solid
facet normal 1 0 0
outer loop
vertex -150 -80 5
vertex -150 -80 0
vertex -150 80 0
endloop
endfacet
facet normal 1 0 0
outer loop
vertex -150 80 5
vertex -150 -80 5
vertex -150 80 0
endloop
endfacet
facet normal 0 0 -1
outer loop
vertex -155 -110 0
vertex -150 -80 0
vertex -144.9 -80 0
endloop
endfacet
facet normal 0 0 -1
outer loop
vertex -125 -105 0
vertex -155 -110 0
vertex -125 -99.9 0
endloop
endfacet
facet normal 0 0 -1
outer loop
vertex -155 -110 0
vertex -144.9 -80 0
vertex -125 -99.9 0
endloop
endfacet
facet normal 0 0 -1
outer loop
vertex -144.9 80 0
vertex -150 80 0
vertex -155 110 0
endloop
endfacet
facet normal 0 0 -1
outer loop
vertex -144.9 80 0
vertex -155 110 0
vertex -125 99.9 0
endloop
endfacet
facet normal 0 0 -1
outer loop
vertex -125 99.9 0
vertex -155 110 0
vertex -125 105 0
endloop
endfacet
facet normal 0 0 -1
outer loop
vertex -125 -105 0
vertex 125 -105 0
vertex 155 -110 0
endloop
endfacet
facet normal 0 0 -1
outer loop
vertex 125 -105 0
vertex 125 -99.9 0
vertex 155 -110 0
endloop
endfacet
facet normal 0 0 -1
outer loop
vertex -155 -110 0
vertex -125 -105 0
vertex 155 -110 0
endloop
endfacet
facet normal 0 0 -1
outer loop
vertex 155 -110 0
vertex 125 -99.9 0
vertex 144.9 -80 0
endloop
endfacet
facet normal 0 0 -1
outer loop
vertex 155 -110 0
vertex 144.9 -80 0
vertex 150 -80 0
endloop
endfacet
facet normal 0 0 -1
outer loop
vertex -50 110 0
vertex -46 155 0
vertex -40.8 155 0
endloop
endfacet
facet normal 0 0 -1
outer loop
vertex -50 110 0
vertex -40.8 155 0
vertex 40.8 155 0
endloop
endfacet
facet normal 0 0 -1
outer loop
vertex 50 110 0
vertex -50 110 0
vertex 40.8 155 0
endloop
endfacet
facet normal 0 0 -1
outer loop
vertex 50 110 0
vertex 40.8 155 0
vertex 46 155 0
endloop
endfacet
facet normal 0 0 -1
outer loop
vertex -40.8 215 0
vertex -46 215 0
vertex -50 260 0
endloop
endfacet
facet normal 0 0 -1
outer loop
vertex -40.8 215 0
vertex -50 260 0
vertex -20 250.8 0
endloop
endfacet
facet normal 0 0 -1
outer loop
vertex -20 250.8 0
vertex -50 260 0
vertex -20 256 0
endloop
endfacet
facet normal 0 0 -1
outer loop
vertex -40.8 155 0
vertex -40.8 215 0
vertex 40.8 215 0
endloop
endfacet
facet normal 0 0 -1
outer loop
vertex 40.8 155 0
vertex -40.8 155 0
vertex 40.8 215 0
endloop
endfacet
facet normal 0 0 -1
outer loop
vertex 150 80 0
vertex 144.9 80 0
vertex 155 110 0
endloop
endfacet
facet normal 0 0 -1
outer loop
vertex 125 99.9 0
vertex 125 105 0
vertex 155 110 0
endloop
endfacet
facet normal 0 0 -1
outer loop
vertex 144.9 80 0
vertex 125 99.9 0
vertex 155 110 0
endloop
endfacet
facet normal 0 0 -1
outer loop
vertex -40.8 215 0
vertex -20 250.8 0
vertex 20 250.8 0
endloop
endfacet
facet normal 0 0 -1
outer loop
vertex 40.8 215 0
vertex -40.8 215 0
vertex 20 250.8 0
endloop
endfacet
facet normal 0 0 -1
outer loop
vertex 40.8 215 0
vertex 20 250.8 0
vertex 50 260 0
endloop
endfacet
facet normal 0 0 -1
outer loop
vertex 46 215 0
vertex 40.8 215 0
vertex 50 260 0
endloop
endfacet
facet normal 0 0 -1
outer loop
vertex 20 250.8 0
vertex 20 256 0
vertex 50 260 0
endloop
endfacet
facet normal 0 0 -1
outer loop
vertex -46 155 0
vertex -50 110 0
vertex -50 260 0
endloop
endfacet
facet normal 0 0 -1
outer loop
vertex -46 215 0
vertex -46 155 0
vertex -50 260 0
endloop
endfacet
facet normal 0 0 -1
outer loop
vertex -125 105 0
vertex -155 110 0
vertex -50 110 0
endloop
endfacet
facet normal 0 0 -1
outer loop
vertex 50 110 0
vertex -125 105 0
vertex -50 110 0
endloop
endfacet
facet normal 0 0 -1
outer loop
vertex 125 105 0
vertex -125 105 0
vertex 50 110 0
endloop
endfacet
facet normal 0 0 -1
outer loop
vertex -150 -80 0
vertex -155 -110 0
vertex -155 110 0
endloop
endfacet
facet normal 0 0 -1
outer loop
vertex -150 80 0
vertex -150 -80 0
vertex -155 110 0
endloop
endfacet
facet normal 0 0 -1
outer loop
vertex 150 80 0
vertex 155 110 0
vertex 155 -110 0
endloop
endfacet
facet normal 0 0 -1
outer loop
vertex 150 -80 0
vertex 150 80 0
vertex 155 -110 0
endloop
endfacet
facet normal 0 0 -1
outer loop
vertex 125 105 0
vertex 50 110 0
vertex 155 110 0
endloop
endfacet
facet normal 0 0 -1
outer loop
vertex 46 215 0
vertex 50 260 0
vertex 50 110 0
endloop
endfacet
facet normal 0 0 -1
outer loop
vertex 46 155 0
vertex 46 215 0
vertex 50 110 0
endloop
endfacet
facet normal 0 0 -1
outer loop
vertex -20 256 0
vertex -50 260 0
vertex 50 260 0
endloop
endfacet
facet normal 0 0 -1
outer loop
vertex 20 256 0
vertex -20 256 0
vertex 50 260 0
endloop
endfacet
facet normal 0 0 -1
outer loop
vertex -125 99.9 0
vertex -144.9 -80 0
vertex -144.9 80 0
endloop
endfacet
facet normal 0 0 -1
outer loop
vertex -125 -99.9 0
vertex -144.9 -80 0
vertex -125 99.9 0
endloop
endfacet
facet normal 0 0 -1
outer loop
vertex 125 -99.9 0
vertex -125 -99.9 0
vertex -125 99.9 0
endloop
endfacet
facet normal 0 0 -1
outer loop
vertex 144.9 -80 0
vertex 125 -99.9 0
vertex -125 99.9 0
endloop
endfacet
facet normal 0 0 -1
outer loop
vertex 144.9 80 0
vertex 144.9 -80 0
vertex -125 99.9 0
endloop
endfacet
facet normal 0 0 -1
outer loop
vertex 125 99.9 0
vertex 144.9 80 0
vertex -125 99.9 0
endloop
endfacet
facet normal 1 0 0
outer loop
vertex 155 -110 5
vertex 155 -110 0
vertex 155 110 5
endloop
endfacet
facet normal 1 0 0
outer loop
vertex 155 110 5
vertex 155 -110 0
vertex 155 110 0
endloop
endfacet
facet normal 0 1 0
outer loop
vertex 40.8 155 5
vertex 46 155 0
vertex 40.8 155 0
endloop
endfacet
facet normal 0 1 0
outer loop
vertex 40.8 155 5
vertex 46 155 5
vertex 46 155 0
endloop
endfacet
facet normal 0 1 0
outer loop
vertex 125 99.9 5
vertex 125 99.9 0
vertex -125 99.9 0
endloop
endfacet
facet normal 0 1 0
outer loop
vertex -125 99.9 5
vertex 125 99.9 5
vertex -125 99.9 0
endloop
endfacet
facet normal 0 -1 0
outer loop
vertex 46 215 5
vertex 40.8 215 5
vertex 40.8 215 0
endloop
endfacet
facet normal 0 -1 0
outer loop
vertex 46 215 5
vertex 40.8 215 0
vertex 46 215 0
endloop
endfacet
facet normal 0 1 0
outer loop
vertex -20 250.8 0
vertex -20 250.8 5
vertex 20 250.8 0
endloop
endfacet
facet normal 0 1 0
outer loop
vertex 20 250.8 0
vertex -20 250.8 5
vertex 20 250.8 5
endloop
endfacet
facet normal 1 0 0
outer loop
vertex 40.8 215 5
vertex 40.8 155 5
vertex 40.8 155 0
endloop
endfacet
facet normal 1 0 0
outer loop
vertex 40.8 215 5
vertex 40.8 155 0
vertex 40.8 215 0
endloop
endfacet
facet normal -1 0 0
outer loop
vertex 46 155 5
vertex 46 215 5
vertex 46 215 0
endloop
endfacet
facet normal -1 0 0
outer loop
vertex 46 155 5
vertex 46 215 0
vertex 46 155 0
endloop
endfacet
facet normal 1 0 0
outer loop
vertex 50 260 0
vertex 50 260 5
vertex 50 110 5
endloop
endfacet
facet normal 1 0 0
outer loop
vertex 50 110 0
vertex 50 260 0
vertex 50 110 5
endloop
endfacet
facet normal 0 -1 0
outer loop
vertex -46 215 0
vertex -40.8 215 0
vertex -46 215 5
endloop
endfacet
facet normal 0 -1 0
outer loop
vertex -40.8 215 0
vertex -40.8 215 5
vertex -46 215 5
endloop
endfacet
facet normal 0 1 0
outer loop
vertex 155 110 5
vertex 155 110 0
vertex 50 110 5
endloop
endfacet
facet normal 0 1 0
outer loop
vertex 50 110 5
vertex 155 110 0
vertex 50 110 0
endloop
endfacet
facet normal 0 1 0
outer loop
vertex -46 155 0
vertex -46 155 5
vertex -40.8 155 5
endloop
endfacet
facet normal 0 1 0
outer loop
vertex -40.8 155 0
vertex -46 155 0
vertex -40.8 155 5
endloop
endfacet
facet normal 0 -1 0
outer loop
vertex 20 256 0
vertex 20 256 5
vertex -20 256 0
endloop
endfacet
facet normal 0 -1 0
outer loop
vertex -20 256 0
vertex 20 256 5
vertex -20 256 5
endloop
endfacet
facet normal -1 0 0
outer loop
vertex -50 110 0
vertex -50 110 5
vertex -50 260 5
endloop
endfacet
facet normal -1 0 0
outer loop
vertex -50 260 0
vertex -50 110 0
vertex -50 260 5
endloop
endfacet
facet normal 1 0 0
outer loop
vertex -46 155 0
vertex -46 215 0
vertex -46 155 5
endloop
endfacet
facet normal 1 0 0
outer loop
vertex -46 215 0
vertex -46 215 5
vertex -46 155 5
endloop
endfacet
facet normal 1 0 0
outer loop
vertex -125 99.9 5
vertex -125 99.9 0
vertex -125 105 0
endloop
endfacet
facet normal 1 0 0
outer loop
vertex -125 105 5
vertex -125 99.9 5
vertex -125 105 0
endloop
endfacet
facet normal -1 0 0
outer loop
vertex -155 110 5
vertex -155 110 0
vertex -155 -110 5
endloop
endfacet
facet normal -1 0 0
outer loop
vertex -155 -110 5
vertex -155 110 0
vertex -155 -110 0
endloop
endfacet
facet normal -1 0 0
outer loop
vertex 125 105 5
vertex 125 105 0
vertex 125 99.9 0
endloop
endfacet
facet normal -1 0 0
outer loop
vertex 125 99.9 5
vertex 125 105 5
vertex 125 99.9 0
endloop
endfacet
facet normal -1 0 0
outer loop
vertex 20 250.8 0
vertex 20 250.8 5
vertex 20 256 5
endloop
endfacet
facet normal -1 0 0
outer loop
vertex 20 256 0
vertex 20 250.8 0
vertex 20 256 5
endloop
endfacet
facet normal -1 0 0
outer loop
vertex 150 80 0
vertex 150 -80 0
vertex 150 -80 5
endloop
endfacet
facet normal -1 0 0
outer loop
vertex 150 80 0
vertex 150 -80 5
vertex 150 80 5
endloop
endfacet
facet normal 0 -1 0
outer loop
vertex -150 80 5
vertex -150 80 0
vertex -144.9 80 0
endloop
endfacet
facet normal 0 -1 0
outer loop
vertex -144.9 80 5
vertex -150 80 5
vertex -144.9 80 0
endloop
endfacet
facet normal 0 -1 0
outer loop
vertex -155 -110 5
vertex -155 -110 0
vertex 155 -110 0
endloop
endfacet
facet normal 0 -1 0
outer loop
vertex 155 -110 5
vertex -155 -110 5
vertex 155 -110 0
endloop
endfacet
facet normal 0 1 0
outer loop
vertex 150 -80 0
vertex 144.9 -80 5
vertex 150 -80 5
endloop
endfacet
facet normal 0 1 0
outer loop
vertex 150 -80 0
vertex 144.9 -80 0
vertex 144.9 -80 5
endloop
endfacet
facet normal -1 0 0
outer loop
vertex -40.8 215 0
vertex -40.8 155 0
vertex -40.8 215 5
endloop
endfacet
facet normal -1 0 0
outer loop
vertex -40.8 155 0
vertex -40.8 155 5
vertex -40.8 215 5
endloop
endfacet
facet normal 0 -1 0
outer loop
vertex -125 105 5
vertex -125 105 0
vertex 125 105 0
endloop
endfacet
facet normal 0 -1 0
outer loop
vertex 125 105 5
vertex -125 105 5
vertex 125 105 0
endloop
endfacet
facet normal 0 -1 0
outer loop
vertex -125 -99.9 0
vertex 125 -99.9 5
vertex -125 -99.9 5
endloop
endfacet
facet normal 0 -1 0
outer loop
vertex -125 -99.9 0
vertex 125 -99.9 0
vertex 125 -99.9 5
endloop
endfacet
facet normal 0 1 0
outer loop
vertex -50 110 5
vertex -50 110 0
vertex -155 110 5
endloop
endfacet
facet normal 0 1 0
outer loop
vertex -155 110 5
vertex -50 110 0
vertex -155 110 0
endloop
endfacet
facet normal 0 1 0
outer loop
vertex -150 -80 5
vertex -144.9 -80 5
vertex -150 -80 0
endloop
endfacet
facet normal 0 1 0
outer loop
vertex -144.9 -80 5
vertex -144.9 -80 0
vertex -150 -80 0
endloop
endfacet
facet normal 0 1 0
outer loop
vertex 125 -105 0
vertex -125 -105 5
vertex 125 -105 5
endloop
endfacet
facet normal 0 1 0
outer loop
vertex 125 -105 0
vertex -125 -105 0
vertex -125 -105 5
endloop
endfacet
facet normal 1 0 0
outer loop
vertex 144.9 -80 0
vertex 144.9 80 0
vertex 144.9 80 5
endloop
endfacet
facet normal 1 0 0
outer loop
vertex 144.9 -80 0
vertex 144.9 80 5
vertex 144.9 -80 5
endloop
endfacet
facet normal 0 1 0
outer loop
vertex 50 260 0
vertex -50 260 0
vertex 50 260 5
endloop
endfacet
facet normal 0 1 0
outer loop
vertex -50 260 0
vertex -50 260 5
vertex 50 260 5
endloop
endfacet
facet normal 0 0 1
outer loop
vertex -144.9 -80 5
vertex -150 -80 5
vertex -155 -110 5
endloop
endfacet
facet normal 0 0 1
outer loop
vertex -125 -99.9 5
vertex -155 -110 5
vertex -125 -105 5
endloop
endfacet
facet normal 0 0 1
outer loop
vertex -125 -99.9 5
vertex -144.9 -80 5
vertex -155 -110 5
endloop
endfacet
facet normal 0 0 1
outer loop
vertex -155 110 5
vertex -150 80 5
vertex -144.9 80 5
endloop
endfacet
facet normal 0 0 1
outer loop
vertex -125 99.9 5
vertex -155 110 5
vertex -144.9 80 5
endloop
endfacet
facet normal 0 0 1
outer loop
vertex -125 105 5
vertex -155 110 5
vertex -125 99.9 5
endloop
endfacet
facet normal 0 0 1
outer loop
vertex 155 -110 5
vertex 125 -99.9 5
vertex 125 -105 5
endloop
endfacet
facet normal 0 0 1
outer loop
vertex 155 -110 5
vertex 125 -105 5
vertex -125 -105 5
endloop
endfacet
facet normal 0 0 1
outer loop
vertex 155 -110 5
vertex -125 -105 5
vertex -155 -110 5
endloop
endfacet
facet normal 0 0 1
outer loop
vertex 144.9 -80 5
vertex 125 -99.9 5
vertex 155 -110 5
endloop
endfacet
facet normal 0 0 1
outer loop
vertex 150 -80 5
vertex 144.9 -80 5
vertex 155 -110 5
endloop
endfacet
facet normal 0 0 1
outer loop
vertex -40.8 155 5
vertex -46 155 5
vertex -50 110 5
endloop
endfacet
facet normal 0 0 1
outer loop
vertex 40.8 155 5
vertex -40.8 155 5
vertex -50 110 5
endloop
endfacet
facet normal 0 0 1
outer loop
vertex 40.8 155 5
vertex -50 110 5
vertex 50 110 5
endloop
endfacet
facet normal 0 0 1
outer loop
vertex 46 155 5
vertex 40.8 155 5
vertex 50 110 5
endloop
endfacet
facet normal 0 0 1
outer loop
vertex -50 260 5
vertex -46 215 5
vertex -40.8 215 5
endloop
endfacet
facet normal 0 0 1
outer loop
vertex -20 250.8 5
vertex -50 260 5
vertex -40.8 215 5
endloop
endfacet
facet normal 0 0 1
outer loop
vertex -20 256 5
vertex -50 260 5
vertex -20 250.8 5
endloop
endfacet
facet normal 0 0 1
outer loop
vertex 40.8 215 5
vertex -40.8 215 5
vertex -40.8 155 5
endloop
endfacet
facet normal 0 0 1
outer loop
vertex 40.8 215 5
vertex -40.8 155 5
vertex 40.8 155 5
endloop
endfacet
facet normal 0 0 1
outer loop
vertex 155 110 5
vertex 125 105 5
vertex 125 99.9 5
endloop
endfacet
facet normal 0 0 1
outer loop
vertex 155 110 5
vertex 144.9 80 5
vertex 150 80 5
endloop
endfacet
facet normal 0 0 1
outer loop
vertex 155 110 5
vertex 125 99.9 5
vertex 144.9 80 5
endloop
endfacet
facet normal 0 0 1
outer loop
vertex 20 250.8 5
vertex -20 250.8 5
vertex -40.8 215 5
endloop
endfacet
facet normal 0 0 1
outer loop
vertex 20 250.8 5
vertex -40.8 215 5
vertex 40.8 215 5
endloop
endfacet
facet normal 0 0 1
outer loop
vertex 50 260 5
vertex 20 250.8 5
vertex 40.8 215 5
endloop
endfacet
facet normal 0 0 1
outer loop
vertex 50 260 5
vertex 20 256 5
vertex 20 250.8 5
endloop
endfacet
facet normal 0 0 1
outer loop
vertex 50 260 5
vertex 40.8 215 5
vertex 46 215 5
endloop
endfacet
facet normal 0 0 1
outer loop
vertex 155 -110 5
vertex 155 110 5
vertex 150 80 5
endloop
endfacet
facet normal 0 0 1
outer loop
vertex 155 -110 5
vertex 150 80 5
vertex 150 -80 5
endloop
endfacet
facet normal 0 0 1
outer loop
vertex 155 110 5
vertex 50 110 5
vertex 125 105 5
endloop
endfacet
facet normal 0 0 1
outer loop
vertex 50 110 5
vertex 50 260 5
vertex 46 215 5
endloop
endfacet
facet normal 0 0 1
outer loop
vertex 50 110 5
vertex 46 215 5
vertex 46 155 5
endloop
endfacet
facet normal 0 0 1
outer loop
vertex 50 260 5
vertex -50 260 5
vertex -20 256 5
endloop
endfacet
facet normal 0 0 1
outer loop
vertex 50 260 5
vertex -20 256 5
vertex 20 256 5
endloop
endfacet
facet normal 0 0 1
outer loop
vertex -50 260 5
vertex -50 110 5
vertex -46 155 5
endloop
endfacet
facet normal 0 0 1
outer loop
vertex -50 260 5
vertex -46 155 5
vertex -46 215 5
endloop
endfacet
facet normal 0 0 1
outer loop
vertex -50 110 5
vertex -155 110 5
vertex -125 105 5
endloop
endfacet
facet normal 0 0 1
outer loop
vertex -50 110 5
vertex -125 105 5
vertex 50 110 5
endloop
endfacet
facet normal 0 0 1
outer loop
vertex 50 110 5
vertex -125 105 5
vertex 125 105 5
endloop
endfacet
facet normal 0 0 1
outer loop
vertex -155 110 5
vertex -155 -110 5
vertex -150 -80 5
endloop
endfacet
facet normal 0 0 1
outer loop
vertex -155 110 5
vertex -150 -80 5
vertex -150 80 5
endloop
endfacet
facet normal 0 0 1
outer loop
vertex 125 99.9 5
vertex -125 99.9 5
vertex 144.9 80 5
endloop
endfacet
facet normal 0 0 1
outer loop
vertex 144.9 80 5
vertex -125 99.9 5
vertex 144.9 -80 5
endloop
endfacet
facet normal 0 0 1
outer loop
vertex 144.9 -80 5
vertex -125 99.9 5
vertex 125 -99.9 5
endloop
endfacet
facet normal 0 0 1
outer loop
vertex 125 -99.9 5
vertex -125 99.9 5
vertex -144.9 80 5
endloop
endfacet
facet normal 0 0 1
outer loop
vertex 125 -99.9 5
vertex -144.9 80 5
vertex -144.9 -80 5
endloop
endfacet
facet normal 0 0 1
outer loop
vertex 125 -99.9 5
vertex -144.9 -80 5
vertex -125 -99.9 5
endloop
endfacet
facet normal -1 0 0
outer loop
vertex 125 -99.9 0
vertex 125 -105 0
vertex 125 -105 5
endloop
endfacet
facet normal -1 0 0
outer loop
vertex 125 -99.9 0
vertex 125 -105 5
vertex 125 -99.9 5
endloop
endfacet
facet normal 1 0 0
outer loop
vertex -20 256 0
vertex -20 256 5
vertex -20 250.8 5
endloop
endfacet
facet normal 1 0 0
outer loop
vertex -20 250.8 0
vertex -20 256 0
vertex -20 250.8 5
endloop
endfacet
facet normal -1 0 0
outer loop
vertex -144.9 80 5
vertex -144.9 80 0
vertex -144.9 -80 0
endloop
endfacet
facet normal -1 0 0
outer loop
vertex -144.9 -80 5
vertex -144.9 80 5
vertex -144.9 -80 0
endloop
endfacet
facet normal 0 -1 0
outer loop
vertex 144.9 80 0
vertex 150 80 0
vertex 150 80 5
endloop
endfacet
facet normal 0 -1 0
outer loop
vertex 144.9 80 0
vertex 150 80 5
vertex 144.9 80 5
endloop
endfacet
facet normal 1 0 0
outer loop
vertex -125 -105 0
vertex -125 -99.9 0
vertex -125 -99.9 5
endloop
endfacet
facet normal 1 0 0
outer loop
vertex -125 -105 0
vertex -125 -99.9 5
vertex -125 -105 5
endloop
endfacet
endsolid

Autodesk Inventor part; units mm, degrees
ref_plane "YZ Plane" through (0, 0, 0) normal (1, 0, 0) x (0, 1, 0)
ref_plane "XZ Plane" through (0, 0, 0) normal (0, 1, 0) x (-1, 0, 0)
ref_plane "XY Plane" through (0, 0, 0) normal (0, 0, 1) x (1, 0, 0)
sketch "Sketch1" plane through (0, 0, 0) normal (0, 0, 1) x (1, 0, 0)
  line L0 (-155, -110) -> (155, -110)
  line L1 (155, -110) -> (155, 110)
  line L2 (155, 110) -> (-155, 110)
  line L3 (-155, 110) -> (-155, -110)
  line L4 (-155, -110) -> (155, 110) construction
  line L5 (155, -110) -> (-155, 110) construction
  line L6 (-125, 105) -> (125, 105)
  line L7 (125, 105) -> (125, 99.9)
  line L8 (125, 99.9) -> (-125, 99.9)
  line L9 (-125, 99.9) -> (-125, 105)
  line L10 (150, 80) -> (144.9, 80)
  line L11 (144.9, 80) -> (144.9, -80)
  line L12 (144.9, -80) -> (150, -80)
  line L13 (150, -80) -> (150, 80)
  line L14 (-155, 0) -> (155, 0)
  line L15 (0, 110) -> (0, -110)
  line L16 (-125, -105) -> (125, -105)
  line L17 (125, -105) -> (125, -99.9)
  line L18 (125, -99.9) -> (-125, -99.9)
  line L19 (-125, -99.9) -> (-125, -105)
  line L20 (-150, 80) -> (-144.9, 80)
  line L21 (-144.9, 80) -> (-144.9, -80)
  line L22 (-144.9, -80) -> (-150, -80)
  line L23 (-150, -80) -> (-150, 80)
  point P0 (0, 0)
  point P1 (0, 105)
  point P2 (144.9, 0)
  point P3 (0, -105)
  point P4 (-144.9, 0)
  dimension "d0" = 310
  dimension "d1" = 220
  dimension "d2" = 5.1
  dimension "d3" = 5.1
  dimension "d4" = 30
  dimension "d5" = 30
  dimension "d6" = 5
  dimension "d7" = 5
extrude "Plate1" add sketch "Sketch1" along normal blind 5 contours L3 L14 L23 L22 L21 L15 L18 L19 L16 L0 | L15 L16 L17 L18 L14 L11 L12 L13 L1 L0 | L3 L2 L15 L6 L9 L8 L14 L21 L20 L23 | L14 L13 L10 L11 L15 L8 L7 L6 L2 L1
sketch "Sketch2" plane through (0, 0, 5) normal (0, 0, 1) x (1, 0, 0)
  line L0 (-50, 260) -> (50, 260)
  line L1 (50, 260) -> (50, 110)
  line L2 (50, 110) -> (-50, 110)
  line L3 (-50, 110) -> (-50, 260)
  line L4 (-155, 110) -> (155, 110)
  point P0 (0, 0)
  point P1 (0, 260)
  point P2 (0, 110)
  point P3 (0, 110)
  dimension "d9" = 100
  dimension "d10" = 150
sheet face with bend "Face2" sketch "Sketch2" thickness 5 toward (0, 0, -1) bend radius 5
bend "Bend1"
sketch "Sketch3" plane through (0, 0, 5) normal (0, 0, 1) x (1, 0, 0)
  line L0 (-20, 250.8) -> (20, 250.8)
  line L1 (20, 250.8) -> (20, 256)
  line L2 (20, 256) -> (-20, 256)
  line L3 (-20, 256) -> (-20, 250.8)
  line L4 (-20, 250.8) -> (20, 256) construction
  line L5 (20, 250.8) -> (-20, 256) construction
  line L6 (50, 260) -> (-50, 260) projected
  line L7 (-46, 155) -> (-40.8, 155)
  line L8 (-40.8, 155) -> (-40.8, 215)
  line L9 (-40.8, 215) -> (-46, 215)
  line L10 (-46, 215) -> (-46, 155)
  line L11 (-46, 155) -> (-40.8, 215) construction
  line L12 (-40.8, 155) -> (-46, 215) construction
  line L13 (-50, 260) -> (-50, 110) projected
  line L14 (-125, 105) -> (125, 105) projected
  line L15 (0, 105) -> (0, 260)
  line L16 (46, 155) -> (40.8, 155)
  line L17 (40.8, 155) -> (40.8, 215)
  line L18 (40.8, 215) -> (46, 215)
  line L19 (46, 215) -> (46, 155)
  line L20 (46, 155) -> (40.8, 215) construction
  line L21 (40.8, 155) -> (46, 215) construction
  point P0 (0, 0)
  point P1 (0, 253.4)
  point P2 (-43.4, 185)
  point P3 (-50, 185)
  point P4 (43.4, 185)
  dimension "d16" = 5.2
  dimension "d17" = 4
  dimension "d18" = 40
  dimension "d19" = 5.2
  dimension "d20" = 60
  dimension "d21" = 4
extrude "Cut1" cut sketch "Sketch3" against normal blind 5
feature "Corner Round1" [suppressed]
equation "\"d7\" = d6"
equation "\"d21\" = d17"
equation "\"d22\" = Thickness"
equation "\"d8\" = Thickness"
equation "\"d11\" = BendRadius"
equation "\"d12\" = BendReliefWidth"
equation "\"d14\" = MinimumRemnant"
equation "\"d13\" = BendReliefDepth"
equation "\"d15\" = TransitionRadius"
equation "\"BendRadius\" = Thickness"
equation "\"BendReliefWidth\" = Thickness"
equation "\"BendReliefDepth\" = 0.5 * Thickness"
equation "\"TransitionRadius\" = BendRadius"
equation "\"JacobiRadiusSize\" = BendRadius"
equation "\"GapSize\" = Thickness"
equation "\"Thickness\" = 5"
equation "\"MinimumRemnant\" = 10"
properties part number "Finishing Sheets .5 ( Buttom )"
